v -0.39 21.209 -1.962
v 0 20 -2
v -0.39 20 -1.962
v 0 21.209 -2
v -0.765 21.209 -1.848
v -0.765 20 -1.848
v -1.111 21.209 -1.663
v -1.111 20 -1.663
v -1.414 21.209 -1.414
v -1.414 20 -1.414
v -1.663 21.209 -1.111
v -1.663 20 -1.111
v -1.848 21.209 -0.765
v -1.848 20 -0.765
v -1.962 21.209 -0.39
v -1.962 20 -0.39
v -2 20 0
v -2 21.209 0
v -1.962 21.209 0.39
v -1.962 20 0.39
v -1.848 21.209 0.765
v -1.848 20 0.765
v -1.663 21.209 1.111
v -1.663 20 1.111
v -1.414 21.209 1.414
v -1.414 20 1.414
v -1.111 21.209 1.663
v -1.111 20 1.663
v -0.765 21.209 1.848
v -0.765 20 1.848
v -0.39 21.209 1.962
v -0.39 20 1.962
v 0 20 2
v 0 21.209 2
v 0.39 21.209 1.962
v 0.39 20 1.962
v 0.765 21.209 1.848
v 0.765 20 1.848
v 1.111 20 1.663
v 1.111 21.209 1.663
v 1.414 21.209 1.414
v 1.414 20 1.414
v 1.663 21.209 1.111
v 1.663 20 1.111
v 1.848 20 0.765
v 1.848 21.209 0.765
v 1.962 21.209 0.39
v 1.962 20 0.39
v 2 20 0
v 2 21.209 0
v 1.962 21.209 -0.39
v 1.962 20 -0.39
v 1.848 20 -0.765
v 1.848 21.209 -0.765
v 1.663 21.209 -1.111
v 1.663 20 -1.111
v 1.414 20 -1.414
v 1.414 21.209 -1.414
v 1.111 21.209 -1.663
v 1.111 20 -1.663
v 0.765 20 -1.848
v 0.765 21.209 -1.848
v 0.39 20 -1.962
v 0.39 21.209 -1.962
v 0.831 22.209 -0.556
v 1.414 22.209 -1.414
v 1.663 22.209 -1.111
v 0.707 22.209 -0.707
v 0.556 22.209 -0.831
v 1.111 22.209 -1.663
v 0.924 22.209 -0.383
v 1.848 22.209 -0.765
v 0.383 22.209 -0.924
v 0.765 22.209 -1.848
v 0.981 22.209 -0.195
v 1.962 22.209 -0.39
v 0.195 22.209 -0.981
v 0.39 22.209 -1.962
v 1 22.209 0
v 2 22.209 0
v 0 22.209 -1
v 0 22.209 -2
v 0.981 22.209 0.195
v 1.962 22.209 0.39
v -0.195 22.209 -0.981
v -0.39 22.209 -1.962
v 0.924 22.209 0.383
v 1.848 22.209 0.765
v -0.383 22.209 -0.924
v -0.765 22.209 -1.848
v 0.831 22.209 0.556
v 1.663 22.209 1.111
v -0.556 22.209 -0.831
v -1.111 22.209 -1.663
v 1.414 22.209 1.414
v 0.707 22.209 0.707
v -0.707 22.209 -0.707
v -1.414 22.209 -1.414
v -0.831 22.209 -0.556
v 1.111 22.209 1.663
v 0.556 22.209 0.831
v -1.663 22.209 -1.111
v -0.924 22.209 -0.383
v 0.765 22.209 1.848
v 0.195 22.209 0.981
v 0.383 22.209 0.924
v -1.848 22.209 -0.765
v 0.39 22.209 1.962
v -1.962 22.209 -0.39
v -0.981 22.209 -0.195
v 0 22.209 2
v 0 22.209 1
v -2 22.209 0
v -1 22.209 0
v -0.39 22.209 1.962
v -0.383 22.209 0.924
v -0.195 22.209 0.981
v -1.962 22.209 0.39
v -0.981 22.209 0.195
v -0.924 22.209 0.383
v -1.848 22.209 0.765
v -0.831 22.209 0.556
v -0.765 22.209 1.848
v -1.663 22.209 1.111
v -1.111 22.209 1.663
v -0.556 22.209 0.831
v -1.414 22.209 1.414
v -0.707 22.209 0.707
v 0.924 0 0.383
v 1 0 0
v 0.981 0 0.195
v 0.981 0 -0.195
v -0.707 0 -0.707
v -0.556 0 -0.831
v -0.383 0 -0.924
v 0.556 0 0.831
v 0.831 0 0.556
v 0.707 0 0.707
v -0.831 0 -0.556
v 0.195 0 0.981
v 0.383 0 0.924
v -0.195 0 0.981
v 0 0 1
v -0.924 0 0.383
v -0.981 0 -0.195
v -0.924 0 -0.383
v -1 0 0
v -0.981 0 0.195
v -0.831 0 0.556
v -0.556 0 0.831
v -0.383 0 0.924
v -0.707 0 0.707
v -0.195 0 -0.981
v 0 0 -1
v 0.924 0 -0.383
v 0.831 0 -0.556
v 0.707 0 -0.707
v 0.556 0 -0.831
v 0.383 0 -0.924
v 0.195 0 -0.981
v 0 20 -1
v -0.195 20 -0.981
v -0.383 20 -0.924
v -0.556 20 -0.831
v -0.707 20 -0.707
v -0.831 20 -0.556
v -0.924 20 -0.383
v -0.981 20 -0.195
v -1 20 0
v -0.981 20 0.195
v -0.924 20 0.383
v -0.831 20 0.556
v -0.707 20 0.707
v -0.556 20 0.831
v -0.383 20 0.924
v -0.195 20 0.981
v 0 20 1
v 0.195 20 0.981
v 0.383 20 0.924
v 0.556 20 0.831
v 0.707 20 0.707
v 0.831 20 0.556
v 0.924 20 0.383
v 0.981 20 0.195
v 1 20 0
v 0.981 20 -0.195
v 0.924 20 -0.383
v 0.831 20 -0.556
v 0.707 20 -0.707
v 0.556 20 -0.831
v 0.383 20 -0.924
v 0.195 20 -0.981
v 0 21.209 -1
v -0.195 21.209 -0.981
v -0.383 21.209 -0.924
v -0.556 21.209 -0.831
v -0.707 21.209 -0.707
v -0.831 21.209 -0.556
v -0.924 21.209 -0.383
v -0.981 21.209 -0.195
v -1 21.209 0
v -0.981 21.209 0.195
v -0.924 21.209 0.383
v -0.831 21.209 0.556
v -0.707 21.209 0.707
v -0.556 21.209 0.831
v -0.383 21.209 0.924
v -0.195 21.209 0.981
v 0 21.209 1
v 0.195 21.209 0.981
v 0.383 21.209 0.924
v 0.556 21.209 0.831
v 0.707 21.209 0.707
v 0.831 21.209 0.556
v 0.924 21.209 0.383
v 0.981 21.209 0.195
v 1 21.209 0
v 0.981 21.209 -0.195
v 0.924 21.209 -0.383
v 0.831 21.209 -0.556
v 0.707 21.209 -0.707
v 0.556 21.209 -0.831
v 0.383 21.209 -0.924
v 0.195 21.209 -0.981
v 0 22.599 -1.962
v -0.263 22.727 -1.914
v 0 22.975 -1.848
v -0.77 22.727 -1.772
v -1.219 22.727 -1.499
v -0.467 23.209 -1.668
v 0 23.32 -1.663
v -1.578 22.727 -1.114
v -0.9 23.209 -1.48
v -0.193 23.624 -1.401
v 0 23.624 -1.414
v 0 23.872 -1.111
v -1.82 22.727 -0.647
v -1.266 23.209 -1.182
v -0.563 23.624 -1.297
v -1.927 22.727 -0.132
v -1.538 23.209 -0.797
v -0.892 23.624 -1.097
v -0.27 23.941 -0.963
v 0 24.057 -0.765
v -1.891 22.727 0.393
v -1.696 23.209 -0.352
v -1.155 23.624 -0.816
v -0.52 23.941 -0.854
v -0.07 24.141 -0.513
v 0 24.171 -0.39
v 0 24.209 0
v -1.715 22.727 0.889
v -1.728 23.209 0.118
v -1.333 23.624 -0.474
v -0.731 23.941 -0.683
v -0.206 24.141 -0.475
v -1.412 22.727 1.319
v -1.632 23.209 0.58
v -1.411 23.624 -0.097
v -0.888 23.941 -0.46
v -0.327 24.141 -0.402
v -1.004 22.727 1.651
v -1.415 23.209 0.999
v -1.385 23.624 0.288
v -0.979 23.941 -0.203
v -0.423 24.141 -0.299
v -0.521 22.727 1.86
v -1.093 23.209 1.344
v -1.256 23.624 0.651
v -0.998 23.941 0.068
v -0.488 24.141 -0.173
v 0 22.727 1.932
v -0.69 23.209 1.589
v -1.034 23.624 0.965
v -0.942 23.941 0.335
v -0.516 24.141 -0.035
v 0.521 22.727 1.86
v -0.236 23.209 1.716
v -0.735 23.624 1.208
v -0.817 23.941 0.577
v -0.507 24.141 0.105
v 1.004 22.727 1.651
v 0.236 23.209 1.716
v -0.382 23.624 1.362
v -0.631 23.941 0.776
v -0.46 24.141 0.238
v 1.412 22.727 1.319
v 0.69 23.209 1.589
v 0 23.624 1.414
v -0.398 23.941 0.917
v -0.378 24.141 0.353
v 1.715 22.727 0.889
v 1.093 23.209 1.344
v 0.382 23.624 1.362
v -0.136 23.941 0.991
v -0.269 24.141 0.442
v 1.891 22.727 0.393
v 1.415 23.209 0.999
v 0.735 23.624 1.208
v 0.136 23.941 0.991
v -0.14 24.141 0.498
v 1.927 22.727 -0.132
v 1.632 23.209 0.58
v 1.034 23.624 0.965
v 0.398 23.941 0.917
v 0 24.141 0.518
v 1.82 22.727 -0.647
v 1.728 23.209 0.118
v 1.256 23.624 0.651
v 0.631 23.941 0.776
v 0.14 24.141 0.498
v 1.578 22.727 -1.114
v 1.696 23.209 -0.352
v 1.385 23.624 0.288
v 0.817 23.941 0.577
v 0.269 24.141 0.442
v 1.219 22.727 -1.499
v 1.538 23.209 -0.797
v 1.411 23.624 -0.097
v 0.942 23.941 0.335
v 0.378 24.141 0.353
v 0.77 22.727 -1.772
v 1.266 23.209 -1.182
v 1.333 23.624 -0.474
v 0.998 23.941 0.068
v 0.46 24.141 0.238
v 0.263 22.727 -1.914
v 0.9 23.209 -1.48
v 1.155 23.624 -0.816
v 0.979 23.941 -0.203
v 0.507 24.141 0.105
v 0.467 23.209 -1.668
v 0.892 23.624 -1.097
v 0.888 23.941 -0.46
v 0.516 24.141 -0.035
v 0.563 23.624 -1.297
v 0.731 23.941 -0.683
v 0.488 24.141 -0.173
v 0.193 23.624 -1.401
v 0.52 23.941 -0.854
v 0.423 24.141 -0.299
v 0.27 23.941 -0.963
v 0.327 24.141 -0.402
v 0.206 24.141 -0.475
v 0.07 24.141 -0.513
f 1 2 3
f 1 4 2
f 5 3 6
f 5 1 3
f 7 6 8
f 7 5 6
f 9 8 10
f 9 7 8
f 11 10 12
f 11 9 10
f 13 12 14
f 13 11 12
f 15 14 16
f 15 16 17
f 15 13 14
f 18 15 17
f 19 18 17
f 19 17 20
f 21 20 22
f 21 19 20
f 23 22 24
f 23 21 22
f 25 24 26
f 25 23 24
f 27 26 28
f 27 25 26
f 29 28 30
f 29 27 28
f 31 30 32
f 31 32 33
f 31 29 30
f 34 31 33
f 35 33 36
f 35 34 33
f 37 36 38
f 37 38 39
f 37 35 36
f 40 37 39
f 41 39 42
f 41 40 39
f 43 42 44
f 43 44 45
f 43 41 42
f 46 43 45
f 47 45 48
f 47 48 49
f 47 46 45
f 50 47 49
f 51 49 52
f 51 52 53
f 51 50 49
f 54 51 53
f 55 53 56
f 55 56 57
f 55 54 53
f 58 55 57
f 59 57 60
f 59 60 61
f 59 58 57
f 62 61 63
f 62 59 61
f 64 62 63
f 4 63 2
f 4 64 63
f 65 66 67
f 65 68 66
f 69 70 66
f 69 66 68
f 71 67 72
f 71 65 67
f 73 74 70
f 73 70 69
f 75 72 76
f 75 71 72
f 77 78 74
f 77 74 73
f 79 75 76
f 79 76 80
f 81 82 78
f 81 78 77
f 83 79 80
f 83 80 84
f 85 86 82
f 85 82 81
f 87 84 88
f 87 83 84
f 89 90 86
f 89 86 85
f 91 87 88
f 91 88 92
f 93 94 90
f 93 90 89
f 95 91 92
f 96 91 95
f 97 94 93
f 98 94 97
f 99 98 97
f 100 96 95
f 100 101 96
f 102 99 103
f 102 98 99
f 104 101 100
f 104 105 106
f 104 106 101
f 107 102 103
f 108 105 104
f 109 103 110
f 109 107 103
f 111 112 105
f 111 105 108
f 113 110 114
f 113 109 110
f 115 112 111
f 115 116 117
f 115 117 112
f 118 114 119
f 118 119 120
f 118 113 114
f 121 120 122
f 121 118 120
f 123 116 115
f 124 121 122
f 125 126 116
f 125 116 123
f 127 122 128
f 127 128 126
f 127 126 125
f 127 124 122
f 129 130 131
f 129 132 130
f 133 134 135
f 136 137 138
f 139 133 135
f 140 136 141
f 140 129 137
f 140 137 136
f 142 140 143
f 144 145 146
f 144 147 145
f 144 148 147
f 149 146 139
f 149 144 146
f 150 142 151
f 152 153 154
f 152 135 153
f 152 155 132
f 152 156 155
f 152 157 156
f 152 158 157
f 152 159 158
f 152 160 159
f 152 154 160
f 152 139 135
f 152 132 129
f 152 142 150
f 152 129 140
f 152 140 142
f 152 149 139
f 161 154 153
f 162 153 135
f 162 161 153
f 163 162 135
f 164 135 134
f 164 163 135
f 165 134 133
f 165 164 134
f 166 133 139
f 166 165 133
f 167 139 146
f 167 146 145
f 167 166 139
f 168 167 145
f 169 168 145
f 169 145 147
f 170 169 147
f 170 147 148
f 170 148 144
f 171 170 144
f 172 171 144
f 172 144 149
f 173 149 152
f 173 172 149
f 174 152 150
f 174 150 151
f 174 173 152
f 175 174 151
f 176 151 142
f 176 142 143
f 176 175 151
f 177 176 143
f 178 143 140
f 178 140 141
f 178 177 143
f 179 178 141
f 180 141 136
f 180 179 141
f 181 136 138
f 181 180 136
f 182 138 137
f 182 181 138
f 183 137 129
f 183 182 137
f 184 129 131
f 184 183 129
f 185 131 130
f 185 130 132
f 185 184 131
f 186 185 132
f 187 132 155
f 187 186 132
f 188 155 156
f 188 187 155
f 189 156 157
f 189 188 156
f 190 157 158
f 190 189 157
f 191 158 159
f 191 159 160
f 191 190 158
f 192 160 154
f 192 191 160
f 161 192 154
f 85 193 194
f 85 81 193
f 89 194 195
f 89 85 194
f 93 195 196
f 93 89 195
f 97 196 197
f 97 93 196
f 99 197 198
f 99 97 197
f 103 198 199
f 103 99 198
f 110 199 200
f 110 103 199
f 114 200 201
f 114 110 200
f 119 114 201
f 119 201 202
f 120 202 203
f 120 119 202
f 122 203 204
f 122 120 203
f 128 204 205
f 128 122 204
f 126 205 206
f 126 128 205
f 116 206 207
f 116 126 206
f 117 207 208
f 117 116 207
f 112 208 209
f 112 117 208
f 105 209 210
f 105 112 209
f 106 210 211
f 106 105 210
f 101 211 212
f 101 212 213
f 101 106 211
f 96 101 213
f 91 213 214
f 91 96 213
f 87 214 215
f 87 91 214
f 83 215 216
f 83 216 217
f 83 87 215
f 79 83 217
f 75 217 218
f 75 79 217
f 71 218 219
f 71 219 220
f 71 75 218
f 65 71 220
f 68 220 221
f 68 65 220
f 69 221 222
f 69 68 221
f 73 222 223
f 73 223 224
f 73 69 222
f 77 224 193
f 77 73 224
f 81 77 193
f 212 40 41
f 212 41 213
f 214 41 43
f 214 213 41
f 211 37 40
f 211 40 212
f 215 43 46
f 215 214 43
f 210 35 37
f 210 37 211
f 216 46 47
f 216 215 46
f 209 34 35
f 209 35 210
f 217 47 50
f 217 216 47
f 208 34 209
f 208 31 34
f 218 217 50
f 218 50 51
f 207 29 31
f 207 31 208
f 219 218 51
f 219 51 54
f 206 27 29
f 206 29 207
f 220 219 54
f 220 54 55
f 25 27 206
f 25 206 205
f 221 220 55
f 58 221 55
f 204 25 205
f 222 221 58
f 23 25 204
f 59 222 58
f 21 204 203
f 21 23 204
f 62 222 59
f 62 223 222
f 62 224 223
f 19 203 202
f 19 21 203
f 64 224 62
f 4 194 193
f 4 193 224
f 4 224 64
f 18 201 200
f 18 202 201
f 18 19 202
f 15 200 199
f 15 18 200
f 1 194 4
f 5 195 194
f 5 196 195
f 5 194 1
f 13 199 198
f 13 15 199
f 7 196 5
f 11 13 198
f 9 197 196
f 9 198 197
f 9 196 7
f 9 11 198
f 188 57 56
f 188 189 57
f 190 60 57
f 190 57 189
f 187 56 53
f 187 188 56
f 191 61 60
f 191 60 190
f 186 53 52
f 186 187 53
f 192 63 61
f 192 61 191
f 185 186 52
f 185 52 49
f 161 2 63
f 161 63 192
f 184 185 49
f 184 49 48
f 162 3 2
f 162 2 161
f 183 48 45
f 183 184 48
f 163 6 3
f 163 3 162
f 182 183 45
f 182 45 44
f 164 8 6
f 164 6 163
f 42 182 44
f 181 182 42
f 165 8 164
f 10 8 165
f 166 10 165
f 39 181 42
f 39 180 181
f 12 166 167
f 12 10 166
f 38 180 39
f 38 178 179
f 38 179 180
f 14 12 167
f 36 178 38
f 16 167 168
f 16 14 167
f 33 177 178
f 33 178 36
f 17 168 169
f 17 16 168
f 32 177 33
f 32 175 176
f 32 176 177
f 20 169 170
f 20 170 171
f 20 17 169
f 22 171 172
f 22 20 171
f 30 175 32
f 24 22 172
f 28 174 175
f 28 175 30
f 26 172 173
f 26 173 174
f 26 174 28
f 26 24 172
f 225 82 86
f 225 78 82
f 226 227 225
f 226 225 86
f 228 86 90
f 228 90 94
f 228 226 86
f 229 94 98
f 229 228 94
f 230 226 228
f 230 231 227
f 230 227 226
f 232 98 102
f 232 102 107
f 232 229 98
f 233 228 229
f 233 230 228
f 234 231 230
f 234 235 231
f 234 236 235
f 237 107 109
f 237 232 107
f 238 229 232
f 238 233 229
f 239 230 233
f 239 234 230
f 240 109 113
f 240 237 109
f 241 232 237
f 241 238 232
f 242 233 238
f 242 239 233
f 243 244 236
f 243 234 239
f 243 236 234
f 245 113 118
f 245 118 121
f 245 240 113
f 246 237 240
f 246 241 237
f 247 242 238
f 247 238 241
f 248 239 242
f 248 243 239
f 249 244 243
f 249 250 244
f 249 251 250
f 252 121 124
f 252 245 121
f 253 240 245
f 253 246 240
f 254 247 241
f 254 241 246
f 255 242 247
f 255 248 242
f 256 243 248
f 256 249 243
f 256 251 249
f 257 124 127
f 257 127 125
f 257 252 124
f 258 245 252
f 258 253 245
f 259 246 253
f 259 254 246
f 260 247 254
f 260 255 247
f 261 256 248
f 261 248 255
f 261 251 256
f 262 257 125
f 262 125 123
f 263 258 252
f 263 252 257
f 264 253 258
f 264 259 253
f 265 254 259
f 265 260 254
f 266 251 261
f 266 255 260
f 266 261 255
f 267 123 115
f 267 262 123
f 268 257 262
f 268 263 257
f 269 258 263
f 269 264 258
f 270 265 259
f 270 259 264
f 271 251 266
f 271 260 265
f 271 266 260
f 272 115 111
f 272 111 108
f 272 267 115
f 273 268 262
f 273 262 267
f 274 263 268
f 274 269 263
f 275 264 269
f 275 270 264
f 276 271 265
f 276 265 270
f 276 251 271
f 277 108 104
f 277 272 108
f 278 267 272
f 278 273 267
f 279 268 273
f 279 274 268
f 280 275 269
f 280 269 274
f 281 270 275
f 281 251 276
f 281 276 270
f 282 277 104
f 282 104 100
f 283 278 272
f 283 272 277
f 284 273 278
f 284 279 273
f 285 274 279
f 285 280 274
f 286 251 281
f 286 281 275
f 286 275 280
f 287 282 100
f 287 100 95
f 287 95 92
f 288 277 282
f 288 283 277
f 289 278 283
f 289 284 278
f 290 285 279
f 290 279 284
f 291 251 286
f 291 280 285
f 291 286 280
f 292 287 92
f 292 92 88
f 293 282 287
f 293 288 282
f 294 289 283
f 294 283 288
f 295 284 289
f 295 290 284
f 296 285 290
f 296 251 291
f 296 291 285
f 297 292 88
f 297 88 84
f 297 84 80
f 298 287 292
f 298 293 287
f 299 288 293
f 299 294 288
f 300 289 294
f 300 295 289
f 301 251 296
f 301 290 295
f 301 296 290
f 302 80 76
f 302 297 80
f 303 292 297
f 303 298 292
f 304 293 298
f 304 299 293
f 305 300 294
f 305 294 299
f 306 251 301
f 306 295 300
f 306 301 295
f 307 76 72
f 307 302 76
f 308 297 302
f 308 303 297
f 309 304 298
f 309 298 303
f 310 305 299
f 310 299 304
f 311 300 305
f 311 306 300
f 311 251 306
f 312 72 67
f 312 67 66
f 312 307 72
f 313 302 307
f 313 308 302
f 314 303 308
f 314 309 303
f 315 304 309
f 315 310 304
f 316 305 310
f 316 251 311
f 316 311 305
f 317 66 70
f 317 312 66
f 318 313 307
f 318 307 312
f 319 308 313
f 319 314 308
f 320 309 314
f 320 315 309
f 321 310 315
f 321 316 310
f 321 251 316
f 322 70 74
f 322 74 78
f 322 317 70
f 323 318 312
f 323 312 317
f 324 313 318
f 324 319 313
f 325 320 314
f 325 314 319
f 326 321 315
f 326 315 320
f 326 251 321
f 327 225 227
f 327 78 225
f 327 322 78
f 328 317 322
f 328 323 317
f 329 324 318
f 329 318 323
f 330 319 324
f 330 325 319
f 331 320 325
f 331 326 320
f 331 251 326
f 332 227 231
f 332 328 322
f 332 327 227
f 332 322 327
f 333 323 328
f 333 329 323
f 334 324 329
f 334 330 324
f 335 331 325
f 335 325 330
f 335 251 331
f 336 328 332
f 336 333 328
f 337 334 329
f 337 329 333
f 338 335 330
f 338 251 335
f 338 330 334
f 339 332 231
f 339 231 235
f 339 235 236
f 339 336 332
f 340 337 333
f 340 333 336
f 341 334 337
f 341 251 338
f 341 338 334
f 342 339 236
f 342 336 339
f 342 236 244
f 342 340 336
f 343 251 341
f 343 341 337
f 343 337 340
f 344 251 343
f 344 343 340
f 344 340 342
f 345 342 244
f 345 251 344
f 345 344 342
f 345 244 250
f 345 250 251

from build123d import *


with BuildPart() as part:
    # Sketch1 → Screw Revolve (revolve)
    with BuildSketch(Plane.XY, mode=Mode.PRIVATE) as screw_revolve_sk:
        with BuildLine():
            Line((0, 0), (1, 0))
            Line((1, 0), (1, 20))
            Line((1, 20), (2, 20))
            Line((2, 20), (2, 21.209302326))
            Line((2, 21.209302326), (1, 21.209302326))
            Line((1, 21.209302326), (1, 22.209302326))
            Line((1, 22.209302326), (2, 22.209302326))
            ThreePointArc((2, 22.209302326), (1.414213562, 23.623515888), (0, 24.209302326))
            Line((0, 24.209302326), (0, 0))
        make_face()
    revolve(screw_revolve_sk.sketch.rotate(Axis((0, 0, 0), (0, 1, 0)), 90), axis=Axis((0, 0, 0), (0, 1, 0)))


solid = part.part
